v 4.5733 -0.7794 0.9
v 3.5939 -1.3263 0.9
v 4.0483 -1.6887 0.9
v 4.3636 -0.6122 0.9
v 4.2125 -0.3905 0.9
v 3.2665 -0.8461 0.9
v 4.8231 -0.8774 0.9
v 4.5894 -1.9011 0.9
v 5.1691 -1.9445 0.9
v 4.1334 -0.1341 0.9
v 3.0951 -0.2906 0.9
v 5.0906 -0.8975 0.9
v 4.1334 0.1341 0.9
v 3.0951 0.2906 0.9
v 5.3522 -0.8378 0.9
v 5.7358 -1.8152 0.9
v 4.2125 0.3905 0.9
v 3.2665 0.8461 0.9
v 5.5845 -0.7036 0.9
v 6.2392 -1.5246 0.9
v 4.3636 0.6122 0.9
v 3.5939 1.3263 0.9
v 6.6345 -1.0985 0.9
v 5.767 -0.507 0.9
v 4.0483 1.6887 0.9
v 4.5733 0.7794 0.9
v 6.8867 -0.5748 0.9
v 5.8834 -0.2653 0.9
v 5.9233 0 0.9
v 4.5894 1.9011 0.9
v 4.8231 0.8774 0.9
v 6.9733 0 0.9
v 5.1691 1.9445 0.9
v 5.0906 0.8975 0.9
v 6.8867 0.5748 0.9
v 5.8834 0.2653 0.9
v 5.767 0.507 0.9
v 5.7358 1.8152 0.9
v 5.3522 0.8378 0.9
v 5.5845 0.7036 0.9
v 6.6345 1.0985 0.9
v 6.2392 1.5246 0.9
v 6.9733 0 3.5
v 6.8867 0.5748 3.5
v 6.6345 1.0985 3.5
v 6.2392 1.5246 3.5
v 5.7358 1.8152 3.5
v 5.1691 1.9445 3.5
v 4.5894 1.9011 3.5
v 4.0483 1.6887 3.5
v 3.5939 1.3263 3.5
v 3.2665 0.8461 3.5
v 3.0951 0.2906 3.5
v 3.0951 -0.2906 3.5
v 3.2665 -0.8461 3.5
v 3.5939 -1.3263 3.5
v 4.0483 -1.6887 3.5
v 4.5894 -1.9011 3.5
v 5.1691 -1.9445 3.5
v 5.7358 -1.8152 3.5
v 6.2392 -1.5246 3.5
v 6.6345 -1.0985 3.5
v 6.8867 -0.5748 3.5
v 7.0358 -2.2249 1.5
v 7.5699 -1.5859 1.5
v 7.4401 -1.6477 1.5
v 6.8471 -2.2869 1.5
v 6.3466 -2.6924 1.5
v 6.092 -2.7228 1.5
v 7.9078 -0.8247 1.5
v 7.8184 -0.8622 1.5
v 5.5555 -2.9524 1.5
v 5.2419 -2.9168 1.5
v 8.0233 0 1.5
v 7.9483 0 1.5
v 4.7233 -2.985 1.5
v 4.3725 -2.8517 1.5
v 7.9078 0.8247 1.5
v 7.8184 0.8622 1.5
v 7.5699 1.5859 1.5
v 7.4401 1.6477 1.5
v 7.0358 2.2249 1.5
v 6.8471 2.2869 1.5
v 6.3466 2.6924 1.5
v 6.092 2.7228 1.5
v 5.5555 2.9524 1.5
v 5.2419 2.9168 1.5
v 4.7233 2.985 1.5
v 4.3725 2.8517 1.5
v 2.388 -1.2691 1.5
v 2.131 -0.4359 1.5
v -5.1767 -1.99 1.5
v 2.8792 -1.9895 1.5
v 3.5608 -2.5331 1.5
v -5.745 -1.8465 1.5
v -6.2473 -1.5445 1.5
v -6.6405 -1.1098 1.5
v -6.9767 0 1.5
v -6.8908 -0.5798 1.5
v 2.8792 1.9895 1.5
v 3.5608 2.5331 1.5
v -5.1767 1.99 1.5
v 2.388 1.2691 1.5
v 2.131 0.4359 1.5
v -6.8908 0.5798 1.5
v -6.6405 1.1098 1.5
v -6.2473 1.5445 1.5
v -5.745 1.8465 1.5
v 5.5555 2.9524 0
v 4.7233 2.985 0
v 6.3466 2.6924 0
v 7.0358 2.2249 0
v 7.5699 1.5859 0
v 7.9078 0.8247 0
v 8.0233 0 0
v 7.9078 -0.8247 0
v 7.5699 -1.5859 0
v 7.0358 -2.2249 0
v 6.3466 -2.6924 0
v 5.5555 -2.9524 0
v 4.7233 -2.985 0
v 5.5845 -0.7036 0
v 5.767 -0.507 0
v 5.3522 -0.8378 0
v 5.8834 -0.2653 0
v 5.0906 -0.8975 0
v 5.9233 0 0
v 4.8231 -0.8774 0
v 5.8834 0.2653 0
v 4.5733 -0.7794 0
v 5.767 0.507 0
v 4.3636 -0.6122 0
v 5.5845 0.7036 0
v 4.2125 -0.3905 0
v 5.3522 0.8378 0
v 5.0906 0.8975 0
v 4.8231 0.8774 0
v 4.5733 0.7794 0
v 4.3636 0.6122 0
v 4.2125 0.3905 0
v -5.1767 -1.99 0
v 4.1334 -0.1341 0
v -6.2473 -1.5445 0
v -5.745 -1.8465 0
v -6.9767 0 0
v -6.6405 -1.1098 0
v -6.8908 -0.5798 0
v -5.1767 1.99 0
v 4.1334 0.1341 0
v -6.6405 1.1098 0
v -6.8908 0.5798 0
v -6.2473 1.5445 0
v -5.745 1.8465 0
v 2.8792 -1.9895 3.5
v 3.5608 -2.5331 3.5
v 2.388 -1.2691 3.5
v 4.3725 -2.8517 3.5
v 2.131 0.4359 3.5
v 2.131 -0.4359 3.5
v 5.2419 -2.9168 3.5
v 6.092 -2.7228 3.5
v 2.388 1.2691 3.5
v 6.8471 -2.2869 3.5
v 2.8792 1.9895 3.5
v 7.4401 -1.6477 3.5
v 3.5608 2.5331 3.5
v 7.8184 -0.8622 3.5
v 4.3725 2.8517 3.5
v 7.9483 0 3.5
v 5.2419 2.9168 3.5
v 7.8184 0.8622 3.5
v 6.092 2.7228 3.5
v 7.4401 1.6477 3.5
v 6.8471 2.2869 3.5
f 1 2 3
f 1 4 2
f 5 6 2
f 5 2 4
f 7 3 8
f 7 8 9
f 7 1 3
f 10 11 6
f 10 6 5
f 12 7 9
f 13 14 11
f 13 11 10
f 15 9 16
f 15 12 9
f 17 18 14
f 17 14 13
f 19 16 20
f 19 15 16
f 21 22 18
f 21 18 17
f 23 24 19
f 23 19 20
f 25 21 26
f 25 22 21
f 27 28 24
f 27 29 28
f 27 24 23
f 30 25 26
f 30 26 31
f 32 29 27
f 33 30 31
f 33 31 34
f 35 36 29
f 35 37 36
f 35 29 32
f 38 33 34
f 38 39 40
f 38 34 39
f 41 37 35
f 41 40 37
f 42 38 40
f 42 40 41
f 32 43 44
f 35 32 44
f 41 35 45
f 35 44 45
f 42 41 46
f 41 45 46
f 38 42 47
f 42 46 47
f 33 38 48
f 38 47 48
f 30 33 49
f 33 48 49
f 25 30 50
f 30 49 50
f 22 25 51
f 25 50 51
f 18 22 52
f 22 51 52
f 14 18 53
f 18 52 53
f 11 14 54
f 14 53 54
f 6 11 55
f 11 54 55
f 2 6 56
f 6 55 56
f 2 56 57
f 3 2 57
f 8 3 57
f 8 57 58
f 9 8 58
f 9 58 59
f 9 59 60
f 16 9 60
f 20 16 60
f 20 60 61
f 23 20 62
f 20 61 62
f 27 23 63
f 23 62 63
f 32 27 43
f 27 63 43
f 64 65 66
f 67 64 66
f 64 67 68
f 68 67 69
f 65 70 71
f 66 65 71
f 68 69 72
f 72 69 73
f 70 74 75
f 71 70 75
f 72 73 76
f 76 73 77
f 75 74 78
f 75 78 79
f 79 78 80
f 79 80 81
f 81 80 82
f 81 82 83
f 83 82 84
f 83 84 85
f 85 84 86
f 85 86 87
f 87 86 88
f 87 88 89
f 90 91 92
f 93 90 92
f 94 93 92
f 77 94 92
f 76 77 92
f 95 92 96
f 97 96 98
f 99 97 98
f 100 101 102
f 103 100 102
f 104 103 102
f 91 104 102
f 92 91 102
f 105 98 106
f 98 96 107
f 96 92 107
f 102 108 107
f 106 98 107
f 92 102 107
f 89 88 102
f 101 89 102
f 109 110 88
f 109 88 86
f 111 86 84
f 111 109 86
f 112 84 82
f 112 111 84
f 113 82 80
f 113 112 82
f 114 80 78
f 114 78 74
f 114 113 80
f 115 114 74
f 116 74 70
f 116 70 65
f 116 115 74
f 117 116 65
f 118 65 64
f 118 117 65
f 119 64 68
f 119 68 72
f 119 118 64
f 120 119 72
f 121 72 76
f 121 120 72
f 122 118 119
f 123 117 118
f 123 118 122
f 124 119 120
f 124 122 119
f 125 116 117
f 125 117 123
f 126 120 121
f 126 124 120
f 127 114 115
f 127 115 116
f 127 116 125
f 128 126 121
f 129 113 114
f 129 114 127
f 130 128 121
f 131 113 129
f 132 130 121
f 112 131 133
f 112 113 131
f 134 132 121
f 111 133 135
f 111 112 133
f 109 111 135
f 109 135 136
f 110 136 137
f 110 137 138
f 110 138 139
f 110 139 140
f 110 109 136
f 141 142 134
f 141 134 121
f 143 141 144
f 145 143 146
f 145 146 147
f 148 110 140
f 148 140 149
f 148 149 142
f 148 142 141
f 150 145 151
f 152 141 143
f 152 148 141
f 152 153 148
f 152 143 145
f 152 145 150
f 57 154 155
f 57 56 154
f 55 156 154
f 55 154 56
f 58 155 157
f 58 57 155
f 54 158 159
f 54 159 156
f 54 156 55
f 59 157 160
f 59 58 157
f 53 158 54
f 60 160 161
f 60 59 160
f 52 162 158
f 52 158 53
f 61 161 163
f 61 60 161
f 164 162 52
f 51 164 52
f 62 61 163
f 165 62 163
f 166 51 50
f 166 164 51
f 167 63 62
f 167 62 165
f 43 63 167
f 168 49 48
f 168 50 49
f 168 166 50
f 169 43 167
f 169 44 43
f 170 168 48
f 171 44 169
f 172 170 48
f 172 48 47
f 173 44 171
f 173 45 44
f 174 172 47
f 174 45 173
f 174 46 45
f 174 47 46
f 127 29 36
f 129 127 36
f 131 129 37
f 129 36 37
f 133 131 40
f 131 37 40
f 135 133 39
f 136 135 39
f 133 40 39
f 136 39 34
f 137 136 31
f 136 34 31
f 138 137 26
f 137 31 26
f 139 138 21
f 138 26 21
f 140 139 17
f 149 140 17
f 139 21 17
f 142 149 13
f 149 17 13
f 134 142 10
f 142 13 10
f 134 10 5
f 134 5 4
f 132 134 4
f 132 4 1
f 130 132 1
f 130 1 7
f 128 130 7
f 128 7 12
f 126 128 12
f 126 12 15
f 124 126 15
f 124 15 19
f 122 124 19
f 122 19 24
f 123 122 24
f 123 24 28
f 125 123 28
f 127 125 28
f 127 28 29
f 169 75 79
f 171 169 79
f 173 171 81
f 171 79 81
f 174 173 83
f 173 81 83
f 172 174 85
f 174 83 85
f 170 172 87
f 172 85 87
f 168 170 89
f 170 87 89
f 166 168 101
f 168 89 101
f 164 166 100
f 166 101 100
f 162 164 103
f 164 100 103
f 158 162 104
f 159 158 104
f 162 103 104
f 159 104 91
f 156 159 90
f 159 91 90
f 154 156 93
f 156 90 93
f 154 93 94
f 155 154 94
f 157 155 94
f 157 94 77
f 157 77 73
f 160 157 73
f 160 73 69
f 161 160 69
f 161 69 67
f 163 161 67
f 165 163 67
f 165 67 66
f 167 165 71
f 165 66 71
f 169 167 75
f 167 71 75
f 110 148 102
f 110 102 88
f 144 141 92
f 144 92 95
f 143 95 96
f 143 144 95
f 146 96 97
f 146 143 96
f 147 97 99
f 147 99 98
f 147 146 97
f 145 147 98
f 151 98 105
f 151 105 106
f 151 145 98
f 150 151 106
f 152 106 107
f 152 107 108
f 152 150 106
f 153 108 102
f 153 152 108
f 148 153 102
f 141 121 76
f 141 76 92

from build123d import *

# Parameters (mm, degrees)
EXTRUSION1_DEPTH = 1.5
ESQUISSE2_R      = 2.925
EXTRUSION2_DEPTH = 2
ESQUISSE3_R      = 0.9
EXTRUSION3_DEPTH = 10.253328027
ESQUISSE4_R      = 1.95
EXTRUSION4_DEPTH = 2.6


with BuildPart() as part:
    # Esquisse1 → Extrusion1 (new body)
    with BuildSketch(Plane.XY):
        with BuildLine():
            Line((-5.176654091, 1.989974874), (4.723345909, 2.984962311))
            ThreePointArc((4.723345909, 2.984962311), (8.023345909, 0), (4.723345909, -2.984962311))
            Line((4.723345909, -2.984962311), (-5.176654091, -1.989974874))
            ThreePointArc((-5.176654091, -1.989974874), (-6.976654091, 0), (-5.176654091, 1.989974874))
        make_face()
    extrude(amount=EXTRUSION1_DEPTH)

    # Esquisse2 → Extrusion2 (add)
    with BuildSketch(Plane.XY.offset(1.5)):
        with Locations((5.023345909, 0)):
            Circle(ESQUISSE2_R)
    extrude(amount=EXTRUSION2_DEPTH)

    # Esquisse3 → Extrusion3 (cut, through all)
    with BuildSketch(Plane.XY.offset(3.5)):
        with Locations((5.023345909, 0)):
            Circle(ESQUISSE3_R)
    extrude(amount=-EXTRUSION3_DEPTH, mode=Mode.SUBTRACT)

    # Esquisse4 → Extrusion4 (cut)
    with BuildSketch(Plane.XY.offset(3.5)):
        with Locations((5.023345909, 0)):
            Circle(ESQUISSE4_R)
    extrude(amount=-EXTRUSION4_DEPTH, mode=Mode.SUBTRACT)


solid = part.part
